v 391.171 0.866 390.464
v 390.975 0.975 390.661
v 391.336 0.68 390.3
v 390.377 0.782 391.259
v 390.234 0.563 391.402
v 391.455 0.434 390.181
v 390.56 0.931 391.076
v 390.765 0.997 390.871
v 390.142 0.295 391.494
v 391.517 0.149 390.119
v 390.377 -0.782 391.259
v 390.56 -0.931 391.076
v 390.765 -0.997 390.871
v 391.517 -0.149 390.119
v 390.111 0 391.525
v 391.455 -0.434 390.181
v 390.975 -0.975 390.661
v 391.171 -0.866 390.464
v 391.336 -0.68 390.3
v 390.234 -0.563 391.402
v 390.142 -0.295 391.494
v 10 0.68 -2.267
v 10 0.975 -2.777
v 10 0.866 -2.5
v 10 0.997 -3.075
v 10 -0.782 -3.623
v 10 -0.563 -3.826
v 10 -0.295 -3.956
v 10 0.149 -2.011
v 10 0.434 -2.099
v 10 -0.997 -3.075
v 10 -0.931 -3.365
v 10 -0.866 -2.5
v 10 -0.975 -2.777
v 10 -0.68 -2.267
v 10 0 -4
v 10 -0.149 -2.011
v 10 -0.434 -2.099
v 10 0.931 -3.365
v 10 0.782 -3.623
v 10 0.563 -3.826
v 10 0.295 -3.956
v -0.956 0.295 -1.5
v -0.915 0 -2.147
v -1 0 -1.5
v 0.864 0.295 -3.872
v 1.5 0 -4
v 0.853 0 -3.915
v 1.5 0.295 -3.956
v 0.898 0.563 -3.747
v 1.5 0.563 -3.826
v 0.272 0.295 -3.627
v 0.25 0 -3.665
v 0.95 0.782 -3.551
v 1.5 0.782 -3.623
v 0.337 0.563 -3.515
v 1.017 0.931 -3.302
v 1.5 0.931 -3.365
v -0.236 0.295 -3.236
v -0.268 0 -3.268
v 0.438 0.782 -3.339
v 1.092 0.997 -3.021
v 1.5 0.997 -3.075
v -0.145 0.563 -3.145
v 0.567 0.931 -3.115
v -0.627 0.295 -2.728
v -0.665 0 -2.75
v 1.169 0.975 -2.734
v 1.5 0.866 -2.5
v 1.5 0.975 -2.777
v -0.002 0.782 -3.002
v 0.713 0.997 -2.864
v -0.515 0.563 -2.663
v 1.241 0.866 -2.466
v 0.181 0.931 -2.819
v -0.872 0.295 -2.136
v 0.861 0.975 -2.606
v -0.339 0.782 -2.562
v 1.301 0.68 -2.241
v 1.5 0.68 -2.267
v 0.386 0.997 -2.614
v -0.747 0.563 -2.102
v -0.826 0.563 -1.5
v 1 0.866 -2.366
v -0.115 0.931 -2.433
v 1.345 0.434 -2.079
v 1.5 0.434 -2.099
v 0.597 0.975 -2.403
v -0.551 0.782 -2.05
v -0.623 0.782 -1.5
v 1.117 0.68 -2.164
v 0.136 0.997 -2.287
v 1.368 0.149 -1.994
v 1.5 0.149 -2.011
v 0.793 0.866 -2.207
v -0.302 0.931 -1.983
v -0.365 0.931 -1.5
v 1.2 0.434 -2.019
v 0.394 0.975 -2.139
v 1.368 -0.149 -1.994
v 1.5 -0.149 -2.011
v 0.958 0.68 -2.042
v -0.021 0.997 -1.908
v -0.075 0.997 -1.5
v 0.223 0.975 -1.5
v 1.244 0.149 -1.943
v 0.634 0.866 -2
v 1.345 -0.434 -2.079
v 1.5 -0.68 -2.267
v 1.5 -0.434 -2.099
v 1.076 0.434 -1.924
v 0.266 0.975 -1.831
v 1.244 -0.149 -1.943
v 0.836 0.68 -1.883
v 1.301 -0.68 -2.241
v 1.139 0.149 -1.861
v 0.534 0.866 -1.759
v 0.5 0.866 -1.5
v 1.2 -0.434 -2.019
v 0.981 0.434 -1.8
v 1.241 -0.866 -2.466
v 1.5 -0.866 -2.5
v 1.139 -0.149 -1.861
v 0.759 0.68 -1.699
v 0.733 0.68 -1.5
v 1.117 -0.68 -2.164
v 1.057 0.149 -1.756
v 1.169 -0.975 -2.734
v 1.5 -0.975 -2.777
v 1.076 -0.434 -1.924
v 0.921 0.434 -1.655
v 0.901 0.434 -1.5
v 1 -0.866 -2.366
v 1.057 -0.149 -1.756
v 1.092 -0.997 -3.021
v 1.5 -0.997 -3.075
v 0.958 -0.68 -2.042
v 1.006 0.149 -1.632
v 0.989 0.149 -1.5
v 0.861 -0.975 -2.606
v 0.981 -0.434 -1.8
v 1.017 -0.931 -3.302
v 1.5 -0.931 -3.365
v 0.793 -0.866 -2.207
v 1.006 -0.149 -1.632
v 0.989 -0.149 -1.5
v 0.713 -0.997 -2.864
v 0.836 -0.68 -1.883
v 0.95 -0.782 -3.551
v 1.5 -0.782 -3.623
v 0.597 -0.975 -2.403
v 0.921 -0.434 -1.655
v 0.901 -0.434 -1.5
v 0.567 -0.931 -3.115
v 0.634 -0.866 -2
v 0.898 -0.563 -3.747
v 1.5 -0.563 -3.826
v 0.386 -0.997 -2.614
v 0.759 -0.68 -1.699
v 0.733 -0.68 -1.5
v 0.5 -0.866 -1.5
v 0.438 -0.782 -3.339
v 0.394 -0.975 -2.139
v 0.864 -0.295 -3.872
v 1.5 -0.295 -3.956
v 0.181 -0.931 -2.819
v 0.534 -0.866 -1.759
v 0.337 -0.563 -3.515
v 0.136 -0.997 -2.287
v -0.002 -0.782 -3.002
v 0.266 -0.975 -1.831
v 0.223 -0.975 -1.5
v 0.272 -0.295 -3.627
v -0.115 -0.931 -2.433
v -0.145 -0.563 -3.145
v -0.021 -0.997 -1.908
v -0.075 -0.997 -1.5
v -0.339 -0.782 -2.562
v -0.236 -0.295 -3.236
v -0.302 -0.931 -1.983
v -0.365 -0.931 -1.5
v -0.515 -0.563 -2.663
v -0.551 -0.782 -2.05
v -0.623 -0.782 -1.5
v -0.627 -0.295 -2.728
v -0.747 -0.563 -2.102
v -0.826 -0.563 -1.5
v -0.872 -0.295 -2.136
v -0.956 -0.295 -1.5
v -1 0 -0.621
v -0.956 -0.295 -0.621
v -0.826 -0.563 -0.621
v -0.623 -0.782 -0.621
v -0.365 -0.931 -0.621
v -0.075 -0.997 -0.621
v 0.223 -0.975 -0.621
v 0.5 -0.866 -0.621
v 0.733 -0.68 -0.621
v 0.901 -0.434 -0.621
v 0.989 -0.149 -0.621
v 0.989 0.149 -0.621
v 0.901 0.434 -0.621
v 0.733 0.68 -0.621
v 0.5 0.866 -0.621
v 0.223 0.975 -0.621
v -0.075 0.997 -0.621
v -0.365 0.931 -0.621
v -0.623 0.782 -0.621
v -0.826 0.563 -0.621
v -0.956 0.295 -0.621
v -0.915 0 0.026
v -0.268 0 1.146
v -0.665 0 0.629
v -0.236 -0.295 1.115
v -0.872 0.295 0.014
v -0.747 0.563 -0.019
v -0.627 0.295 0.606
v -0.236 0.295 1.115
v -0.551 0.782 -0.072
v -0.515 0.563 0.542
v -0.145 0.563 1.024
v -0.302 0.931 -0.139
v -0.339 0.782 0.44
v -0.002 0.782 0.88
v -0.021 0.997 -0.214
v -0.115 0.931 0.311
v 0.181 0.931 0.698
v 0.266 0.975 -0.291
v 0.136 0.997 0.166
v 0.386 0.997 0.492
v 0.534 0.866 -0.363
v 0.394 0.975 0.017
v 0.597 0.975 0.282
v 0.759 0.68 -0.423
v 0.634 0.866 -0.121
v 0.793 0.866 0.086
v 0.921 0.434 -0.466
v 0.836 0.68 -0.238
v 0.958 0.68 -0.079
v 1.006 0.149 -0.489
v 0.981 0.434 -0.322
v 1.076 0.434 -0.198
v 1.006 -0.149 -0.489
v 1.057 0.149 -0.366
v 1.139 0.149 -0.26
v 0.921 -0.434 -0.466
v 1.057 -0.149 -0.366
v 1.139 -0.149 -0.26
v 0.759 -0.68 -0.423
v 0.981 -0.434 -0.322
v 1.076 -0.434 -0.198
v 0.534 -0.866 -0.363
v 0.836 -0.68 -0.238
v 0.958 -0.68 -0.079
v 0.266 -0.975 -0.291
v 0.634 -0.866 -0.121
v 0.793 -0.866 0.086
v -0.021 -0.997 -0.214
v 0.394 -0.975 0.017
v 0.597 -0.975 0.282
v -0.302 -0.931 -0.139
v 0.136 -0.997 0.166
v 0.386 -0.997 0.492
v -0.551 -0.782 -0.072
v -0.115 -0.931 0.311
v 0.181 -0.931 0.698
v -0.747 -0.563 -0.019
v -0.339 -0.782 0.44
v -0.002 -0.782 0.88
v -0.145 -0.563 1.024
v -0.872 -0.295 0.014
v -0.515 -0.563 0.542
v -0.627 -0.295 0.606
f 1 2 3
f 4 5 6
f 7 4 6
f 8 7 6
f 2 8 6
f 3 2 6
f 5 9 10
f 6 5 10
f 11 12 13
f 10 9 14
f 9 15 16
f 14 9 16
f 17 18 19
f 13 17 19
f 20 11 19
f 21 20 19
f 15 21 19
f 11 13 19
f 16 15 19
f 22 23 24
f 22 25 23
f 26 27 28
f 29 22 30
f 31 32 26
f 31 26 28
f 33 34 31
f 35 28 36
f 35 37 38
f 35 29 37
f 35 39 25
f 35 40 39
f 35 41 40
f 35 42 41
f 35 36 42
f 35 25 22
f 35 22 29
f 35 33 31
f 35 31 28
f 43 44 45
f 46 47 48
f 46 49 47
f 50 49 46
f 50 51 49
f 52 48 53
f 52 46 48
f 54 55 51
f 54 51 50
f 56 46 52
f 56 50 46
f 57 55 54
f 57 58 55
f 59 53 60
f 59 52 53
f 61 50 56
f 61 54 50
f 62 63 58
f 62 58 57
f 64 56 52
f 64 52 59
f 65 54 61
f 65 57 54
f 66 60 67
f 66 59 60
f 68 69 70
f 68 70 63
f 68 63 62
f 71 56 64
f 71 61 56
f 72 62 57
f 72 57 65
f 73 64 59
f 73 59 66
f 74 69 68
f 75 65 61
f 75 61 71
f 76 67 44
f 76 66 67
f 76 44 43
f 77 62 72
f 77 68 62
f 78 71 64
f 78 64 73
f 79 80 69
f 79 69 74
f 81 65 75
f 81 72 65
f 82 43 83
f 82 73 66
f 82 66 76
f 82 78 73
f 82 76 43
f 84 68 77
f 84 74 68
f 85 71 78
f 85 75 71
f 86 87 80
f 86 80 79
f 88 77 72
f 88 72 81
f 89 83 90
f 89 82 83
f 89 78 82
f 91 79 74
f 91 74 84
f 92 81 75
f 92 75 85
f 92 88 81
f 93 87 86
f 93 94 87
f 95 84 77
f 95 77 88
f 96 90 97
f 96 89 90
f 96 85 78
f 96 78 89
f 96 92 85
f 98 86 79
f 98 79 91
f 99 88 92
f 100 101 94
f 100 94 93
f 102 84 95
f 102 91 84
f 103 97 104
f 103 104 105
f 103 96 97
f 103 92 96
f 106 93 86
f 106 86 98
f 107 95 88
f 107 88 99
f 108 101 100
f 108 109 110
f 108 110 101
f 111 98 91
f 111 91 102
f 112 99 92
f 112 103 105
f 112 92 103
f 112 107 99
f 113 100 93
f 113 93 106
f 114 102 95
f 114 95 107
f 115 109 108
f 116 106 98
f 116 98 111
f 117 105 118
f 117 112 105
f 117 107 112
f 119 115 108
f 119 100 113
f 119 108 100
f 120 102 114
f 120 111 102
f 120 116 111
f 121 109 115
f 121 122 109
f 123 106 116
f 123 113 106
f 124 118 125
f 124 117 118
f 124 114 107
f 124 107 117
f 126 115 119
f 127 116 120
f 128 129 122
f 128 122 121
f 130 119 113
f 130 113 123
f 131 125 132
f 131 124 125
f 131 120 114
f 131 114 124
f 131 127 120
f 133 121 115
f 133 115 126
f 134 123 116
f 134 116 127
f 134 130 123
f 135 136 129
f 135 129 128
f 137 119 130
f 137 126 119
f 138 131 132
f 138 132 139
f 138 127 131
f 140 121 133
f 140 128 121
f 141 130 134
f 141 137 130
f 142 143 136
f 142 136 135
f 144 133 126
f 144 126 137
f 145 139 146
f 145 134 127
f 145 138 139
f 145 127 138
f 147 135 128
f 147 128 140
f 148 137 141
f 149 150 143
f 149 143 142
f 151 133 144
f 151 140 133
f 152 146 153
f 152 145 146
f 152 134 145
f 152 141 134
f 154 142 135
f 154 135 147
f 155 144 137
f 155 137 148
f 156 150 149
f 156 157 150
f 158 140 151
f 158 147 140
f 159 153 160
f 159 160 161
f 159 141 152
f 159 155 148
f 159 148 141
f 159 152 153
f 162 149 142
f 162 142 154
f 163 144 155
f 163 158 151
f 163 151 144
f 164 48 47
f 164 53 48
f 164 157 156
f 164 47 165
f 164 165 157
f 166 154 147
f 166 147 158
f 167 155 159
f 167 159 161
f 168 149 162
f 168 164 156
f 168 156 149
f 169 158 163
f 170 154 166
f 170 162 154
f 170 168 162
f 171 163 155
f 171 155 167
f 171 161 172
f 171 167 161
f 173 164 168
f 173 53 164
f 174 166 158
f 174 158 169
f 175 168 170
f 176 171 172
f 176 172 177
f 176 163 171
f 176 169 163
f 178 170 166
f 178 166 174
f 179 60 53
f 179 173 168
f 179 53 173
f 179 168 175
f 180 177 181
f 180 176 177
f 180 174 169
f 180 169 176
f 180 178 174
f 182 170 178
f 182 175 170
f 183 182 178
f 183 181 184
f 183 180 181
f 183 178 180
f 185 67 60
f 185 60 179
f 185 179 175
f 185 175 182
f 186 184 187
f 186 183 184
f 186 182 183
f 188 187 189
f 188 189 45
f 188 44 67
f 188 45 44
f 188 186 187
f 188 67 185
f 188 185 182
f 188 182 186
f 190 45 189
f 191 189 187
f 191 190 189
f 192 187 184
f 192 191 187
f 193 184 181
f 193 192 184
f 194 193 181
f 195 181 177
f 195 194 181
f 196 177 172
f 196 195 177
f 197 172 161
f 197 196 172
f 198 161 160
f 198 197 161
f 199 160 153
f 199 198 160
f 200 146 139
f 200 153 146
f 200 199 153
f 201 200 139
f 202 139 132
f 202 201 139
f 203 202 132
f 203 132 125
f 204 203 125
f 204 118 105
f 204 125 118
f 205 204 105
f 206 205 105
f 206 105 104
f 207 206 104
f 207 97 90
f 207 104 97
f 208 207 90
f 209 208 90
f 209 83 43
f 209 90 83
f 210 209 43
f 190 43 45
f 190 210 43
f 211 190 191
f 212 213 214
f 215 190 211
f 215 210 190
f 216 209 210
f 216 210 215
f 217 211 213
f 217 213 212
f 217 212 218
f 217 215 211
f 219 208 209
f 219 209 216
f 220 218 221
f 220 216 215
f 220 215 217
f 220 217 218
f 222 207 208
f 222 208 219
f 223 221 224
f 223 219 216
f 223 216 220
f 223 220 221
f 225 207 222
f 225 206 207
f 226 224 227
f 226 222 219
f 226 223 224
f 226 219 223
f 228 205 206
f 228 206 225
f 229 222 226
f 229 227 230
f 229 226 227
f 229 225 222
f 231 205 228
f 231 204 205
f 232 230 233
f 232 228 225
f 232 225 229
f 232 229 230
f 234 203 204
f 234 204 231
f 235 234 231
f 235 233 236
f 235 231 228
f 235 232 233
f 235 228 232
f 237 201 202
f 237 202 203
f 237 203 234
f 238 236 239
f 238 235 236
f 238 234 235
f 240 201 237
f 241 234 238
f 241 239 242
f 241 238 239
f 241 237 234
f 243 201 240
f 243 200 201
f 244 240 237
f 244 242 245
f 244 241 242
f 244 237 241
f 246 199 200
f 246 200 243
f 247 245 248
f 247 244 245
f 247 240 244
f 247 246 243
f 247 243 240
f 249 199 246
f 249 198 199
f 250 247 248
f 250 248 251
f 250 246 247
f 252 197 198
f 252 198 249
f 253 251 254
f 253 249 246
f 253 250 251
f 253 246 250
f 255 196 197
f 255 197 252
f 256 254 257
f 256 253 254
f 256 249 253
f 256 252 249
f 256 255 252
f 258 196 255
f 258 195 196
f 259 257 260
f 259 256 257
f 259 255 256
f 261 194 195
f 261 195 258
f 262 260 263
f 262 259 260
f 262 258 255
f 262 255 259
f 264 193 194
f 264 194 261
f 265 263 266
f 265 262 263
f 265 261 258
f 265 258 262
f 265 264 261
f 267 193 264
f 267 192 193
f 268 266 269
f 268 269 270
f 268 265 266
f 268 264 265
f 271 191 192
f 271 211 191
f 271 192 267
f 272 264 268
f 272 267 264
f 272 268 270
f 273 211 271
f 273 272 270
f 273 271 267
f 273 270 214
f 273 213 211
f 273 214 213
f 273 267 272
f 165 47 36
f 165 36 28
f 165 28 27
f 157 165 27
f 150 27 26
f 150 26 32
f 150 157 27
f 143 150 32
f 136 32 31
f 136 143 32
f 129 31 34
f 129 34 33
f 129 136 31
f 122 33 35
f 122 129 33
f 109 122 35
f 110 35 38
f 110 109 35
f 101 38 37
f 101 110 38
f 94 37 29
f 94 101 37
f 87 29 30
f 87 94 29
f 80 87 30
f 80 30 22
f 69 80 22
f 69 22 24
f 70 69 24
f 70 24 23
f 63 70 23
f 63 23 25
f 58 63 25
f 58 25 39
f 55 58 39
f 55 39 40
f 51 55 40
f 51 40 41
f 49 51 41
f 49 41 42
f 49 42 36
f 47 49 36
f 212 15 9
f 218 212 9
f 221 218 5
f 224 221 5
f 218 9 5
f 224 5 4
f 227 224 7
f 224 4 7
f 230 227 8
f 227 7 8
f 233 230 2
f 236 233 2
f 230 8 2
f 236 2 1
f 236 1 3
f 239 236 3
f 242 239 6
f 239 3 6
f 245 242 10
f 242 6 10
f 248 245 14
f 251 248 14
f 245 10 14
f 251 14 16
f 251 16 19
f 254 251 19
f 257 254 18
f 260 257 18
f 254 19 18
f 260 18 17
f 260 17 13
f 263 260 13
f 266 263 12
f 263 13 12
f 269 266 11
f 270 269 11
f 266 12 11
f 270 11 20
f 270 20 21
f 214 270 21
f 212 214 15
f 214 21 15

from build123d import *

# Parameters (mm, degrees)
SKETCH4_R = 1


with BuildPart() as part:
    # Sweep1: sweep along a path in Sketch1
    with BuildLine(Plane(origin=(0, 0, 0), x_dir=(1, 0, 0), z_dir=(0, 1, 0))) as sweep1_path:
        Line((10, 3), (1.5, 3))
        ThreePointArc((1.5, 3), (0.439339828, 2.560660172), (0, 1.5))
        Line((0, 1.5), (0, 0.621320344))
        ThreePointArc((0, 0.621320344), (0.114180701, 0.047295195), (0.439339828, -0.439339828))
        Line((0.439339828, -0.439339828), (390.817917962, -390.817917962))
    # Sketch4 → Sweep1 (sweep)
    with BuildSketch(Plane(origin=(10, 0, 0), x_dir=(0, 0, -1), z_dir=(1, 0, 0))):
        with Locations((3, 0)):
            Circle(SKETCH4_R)
    sweep(path=sweep1_path.line)


solid = part.part
